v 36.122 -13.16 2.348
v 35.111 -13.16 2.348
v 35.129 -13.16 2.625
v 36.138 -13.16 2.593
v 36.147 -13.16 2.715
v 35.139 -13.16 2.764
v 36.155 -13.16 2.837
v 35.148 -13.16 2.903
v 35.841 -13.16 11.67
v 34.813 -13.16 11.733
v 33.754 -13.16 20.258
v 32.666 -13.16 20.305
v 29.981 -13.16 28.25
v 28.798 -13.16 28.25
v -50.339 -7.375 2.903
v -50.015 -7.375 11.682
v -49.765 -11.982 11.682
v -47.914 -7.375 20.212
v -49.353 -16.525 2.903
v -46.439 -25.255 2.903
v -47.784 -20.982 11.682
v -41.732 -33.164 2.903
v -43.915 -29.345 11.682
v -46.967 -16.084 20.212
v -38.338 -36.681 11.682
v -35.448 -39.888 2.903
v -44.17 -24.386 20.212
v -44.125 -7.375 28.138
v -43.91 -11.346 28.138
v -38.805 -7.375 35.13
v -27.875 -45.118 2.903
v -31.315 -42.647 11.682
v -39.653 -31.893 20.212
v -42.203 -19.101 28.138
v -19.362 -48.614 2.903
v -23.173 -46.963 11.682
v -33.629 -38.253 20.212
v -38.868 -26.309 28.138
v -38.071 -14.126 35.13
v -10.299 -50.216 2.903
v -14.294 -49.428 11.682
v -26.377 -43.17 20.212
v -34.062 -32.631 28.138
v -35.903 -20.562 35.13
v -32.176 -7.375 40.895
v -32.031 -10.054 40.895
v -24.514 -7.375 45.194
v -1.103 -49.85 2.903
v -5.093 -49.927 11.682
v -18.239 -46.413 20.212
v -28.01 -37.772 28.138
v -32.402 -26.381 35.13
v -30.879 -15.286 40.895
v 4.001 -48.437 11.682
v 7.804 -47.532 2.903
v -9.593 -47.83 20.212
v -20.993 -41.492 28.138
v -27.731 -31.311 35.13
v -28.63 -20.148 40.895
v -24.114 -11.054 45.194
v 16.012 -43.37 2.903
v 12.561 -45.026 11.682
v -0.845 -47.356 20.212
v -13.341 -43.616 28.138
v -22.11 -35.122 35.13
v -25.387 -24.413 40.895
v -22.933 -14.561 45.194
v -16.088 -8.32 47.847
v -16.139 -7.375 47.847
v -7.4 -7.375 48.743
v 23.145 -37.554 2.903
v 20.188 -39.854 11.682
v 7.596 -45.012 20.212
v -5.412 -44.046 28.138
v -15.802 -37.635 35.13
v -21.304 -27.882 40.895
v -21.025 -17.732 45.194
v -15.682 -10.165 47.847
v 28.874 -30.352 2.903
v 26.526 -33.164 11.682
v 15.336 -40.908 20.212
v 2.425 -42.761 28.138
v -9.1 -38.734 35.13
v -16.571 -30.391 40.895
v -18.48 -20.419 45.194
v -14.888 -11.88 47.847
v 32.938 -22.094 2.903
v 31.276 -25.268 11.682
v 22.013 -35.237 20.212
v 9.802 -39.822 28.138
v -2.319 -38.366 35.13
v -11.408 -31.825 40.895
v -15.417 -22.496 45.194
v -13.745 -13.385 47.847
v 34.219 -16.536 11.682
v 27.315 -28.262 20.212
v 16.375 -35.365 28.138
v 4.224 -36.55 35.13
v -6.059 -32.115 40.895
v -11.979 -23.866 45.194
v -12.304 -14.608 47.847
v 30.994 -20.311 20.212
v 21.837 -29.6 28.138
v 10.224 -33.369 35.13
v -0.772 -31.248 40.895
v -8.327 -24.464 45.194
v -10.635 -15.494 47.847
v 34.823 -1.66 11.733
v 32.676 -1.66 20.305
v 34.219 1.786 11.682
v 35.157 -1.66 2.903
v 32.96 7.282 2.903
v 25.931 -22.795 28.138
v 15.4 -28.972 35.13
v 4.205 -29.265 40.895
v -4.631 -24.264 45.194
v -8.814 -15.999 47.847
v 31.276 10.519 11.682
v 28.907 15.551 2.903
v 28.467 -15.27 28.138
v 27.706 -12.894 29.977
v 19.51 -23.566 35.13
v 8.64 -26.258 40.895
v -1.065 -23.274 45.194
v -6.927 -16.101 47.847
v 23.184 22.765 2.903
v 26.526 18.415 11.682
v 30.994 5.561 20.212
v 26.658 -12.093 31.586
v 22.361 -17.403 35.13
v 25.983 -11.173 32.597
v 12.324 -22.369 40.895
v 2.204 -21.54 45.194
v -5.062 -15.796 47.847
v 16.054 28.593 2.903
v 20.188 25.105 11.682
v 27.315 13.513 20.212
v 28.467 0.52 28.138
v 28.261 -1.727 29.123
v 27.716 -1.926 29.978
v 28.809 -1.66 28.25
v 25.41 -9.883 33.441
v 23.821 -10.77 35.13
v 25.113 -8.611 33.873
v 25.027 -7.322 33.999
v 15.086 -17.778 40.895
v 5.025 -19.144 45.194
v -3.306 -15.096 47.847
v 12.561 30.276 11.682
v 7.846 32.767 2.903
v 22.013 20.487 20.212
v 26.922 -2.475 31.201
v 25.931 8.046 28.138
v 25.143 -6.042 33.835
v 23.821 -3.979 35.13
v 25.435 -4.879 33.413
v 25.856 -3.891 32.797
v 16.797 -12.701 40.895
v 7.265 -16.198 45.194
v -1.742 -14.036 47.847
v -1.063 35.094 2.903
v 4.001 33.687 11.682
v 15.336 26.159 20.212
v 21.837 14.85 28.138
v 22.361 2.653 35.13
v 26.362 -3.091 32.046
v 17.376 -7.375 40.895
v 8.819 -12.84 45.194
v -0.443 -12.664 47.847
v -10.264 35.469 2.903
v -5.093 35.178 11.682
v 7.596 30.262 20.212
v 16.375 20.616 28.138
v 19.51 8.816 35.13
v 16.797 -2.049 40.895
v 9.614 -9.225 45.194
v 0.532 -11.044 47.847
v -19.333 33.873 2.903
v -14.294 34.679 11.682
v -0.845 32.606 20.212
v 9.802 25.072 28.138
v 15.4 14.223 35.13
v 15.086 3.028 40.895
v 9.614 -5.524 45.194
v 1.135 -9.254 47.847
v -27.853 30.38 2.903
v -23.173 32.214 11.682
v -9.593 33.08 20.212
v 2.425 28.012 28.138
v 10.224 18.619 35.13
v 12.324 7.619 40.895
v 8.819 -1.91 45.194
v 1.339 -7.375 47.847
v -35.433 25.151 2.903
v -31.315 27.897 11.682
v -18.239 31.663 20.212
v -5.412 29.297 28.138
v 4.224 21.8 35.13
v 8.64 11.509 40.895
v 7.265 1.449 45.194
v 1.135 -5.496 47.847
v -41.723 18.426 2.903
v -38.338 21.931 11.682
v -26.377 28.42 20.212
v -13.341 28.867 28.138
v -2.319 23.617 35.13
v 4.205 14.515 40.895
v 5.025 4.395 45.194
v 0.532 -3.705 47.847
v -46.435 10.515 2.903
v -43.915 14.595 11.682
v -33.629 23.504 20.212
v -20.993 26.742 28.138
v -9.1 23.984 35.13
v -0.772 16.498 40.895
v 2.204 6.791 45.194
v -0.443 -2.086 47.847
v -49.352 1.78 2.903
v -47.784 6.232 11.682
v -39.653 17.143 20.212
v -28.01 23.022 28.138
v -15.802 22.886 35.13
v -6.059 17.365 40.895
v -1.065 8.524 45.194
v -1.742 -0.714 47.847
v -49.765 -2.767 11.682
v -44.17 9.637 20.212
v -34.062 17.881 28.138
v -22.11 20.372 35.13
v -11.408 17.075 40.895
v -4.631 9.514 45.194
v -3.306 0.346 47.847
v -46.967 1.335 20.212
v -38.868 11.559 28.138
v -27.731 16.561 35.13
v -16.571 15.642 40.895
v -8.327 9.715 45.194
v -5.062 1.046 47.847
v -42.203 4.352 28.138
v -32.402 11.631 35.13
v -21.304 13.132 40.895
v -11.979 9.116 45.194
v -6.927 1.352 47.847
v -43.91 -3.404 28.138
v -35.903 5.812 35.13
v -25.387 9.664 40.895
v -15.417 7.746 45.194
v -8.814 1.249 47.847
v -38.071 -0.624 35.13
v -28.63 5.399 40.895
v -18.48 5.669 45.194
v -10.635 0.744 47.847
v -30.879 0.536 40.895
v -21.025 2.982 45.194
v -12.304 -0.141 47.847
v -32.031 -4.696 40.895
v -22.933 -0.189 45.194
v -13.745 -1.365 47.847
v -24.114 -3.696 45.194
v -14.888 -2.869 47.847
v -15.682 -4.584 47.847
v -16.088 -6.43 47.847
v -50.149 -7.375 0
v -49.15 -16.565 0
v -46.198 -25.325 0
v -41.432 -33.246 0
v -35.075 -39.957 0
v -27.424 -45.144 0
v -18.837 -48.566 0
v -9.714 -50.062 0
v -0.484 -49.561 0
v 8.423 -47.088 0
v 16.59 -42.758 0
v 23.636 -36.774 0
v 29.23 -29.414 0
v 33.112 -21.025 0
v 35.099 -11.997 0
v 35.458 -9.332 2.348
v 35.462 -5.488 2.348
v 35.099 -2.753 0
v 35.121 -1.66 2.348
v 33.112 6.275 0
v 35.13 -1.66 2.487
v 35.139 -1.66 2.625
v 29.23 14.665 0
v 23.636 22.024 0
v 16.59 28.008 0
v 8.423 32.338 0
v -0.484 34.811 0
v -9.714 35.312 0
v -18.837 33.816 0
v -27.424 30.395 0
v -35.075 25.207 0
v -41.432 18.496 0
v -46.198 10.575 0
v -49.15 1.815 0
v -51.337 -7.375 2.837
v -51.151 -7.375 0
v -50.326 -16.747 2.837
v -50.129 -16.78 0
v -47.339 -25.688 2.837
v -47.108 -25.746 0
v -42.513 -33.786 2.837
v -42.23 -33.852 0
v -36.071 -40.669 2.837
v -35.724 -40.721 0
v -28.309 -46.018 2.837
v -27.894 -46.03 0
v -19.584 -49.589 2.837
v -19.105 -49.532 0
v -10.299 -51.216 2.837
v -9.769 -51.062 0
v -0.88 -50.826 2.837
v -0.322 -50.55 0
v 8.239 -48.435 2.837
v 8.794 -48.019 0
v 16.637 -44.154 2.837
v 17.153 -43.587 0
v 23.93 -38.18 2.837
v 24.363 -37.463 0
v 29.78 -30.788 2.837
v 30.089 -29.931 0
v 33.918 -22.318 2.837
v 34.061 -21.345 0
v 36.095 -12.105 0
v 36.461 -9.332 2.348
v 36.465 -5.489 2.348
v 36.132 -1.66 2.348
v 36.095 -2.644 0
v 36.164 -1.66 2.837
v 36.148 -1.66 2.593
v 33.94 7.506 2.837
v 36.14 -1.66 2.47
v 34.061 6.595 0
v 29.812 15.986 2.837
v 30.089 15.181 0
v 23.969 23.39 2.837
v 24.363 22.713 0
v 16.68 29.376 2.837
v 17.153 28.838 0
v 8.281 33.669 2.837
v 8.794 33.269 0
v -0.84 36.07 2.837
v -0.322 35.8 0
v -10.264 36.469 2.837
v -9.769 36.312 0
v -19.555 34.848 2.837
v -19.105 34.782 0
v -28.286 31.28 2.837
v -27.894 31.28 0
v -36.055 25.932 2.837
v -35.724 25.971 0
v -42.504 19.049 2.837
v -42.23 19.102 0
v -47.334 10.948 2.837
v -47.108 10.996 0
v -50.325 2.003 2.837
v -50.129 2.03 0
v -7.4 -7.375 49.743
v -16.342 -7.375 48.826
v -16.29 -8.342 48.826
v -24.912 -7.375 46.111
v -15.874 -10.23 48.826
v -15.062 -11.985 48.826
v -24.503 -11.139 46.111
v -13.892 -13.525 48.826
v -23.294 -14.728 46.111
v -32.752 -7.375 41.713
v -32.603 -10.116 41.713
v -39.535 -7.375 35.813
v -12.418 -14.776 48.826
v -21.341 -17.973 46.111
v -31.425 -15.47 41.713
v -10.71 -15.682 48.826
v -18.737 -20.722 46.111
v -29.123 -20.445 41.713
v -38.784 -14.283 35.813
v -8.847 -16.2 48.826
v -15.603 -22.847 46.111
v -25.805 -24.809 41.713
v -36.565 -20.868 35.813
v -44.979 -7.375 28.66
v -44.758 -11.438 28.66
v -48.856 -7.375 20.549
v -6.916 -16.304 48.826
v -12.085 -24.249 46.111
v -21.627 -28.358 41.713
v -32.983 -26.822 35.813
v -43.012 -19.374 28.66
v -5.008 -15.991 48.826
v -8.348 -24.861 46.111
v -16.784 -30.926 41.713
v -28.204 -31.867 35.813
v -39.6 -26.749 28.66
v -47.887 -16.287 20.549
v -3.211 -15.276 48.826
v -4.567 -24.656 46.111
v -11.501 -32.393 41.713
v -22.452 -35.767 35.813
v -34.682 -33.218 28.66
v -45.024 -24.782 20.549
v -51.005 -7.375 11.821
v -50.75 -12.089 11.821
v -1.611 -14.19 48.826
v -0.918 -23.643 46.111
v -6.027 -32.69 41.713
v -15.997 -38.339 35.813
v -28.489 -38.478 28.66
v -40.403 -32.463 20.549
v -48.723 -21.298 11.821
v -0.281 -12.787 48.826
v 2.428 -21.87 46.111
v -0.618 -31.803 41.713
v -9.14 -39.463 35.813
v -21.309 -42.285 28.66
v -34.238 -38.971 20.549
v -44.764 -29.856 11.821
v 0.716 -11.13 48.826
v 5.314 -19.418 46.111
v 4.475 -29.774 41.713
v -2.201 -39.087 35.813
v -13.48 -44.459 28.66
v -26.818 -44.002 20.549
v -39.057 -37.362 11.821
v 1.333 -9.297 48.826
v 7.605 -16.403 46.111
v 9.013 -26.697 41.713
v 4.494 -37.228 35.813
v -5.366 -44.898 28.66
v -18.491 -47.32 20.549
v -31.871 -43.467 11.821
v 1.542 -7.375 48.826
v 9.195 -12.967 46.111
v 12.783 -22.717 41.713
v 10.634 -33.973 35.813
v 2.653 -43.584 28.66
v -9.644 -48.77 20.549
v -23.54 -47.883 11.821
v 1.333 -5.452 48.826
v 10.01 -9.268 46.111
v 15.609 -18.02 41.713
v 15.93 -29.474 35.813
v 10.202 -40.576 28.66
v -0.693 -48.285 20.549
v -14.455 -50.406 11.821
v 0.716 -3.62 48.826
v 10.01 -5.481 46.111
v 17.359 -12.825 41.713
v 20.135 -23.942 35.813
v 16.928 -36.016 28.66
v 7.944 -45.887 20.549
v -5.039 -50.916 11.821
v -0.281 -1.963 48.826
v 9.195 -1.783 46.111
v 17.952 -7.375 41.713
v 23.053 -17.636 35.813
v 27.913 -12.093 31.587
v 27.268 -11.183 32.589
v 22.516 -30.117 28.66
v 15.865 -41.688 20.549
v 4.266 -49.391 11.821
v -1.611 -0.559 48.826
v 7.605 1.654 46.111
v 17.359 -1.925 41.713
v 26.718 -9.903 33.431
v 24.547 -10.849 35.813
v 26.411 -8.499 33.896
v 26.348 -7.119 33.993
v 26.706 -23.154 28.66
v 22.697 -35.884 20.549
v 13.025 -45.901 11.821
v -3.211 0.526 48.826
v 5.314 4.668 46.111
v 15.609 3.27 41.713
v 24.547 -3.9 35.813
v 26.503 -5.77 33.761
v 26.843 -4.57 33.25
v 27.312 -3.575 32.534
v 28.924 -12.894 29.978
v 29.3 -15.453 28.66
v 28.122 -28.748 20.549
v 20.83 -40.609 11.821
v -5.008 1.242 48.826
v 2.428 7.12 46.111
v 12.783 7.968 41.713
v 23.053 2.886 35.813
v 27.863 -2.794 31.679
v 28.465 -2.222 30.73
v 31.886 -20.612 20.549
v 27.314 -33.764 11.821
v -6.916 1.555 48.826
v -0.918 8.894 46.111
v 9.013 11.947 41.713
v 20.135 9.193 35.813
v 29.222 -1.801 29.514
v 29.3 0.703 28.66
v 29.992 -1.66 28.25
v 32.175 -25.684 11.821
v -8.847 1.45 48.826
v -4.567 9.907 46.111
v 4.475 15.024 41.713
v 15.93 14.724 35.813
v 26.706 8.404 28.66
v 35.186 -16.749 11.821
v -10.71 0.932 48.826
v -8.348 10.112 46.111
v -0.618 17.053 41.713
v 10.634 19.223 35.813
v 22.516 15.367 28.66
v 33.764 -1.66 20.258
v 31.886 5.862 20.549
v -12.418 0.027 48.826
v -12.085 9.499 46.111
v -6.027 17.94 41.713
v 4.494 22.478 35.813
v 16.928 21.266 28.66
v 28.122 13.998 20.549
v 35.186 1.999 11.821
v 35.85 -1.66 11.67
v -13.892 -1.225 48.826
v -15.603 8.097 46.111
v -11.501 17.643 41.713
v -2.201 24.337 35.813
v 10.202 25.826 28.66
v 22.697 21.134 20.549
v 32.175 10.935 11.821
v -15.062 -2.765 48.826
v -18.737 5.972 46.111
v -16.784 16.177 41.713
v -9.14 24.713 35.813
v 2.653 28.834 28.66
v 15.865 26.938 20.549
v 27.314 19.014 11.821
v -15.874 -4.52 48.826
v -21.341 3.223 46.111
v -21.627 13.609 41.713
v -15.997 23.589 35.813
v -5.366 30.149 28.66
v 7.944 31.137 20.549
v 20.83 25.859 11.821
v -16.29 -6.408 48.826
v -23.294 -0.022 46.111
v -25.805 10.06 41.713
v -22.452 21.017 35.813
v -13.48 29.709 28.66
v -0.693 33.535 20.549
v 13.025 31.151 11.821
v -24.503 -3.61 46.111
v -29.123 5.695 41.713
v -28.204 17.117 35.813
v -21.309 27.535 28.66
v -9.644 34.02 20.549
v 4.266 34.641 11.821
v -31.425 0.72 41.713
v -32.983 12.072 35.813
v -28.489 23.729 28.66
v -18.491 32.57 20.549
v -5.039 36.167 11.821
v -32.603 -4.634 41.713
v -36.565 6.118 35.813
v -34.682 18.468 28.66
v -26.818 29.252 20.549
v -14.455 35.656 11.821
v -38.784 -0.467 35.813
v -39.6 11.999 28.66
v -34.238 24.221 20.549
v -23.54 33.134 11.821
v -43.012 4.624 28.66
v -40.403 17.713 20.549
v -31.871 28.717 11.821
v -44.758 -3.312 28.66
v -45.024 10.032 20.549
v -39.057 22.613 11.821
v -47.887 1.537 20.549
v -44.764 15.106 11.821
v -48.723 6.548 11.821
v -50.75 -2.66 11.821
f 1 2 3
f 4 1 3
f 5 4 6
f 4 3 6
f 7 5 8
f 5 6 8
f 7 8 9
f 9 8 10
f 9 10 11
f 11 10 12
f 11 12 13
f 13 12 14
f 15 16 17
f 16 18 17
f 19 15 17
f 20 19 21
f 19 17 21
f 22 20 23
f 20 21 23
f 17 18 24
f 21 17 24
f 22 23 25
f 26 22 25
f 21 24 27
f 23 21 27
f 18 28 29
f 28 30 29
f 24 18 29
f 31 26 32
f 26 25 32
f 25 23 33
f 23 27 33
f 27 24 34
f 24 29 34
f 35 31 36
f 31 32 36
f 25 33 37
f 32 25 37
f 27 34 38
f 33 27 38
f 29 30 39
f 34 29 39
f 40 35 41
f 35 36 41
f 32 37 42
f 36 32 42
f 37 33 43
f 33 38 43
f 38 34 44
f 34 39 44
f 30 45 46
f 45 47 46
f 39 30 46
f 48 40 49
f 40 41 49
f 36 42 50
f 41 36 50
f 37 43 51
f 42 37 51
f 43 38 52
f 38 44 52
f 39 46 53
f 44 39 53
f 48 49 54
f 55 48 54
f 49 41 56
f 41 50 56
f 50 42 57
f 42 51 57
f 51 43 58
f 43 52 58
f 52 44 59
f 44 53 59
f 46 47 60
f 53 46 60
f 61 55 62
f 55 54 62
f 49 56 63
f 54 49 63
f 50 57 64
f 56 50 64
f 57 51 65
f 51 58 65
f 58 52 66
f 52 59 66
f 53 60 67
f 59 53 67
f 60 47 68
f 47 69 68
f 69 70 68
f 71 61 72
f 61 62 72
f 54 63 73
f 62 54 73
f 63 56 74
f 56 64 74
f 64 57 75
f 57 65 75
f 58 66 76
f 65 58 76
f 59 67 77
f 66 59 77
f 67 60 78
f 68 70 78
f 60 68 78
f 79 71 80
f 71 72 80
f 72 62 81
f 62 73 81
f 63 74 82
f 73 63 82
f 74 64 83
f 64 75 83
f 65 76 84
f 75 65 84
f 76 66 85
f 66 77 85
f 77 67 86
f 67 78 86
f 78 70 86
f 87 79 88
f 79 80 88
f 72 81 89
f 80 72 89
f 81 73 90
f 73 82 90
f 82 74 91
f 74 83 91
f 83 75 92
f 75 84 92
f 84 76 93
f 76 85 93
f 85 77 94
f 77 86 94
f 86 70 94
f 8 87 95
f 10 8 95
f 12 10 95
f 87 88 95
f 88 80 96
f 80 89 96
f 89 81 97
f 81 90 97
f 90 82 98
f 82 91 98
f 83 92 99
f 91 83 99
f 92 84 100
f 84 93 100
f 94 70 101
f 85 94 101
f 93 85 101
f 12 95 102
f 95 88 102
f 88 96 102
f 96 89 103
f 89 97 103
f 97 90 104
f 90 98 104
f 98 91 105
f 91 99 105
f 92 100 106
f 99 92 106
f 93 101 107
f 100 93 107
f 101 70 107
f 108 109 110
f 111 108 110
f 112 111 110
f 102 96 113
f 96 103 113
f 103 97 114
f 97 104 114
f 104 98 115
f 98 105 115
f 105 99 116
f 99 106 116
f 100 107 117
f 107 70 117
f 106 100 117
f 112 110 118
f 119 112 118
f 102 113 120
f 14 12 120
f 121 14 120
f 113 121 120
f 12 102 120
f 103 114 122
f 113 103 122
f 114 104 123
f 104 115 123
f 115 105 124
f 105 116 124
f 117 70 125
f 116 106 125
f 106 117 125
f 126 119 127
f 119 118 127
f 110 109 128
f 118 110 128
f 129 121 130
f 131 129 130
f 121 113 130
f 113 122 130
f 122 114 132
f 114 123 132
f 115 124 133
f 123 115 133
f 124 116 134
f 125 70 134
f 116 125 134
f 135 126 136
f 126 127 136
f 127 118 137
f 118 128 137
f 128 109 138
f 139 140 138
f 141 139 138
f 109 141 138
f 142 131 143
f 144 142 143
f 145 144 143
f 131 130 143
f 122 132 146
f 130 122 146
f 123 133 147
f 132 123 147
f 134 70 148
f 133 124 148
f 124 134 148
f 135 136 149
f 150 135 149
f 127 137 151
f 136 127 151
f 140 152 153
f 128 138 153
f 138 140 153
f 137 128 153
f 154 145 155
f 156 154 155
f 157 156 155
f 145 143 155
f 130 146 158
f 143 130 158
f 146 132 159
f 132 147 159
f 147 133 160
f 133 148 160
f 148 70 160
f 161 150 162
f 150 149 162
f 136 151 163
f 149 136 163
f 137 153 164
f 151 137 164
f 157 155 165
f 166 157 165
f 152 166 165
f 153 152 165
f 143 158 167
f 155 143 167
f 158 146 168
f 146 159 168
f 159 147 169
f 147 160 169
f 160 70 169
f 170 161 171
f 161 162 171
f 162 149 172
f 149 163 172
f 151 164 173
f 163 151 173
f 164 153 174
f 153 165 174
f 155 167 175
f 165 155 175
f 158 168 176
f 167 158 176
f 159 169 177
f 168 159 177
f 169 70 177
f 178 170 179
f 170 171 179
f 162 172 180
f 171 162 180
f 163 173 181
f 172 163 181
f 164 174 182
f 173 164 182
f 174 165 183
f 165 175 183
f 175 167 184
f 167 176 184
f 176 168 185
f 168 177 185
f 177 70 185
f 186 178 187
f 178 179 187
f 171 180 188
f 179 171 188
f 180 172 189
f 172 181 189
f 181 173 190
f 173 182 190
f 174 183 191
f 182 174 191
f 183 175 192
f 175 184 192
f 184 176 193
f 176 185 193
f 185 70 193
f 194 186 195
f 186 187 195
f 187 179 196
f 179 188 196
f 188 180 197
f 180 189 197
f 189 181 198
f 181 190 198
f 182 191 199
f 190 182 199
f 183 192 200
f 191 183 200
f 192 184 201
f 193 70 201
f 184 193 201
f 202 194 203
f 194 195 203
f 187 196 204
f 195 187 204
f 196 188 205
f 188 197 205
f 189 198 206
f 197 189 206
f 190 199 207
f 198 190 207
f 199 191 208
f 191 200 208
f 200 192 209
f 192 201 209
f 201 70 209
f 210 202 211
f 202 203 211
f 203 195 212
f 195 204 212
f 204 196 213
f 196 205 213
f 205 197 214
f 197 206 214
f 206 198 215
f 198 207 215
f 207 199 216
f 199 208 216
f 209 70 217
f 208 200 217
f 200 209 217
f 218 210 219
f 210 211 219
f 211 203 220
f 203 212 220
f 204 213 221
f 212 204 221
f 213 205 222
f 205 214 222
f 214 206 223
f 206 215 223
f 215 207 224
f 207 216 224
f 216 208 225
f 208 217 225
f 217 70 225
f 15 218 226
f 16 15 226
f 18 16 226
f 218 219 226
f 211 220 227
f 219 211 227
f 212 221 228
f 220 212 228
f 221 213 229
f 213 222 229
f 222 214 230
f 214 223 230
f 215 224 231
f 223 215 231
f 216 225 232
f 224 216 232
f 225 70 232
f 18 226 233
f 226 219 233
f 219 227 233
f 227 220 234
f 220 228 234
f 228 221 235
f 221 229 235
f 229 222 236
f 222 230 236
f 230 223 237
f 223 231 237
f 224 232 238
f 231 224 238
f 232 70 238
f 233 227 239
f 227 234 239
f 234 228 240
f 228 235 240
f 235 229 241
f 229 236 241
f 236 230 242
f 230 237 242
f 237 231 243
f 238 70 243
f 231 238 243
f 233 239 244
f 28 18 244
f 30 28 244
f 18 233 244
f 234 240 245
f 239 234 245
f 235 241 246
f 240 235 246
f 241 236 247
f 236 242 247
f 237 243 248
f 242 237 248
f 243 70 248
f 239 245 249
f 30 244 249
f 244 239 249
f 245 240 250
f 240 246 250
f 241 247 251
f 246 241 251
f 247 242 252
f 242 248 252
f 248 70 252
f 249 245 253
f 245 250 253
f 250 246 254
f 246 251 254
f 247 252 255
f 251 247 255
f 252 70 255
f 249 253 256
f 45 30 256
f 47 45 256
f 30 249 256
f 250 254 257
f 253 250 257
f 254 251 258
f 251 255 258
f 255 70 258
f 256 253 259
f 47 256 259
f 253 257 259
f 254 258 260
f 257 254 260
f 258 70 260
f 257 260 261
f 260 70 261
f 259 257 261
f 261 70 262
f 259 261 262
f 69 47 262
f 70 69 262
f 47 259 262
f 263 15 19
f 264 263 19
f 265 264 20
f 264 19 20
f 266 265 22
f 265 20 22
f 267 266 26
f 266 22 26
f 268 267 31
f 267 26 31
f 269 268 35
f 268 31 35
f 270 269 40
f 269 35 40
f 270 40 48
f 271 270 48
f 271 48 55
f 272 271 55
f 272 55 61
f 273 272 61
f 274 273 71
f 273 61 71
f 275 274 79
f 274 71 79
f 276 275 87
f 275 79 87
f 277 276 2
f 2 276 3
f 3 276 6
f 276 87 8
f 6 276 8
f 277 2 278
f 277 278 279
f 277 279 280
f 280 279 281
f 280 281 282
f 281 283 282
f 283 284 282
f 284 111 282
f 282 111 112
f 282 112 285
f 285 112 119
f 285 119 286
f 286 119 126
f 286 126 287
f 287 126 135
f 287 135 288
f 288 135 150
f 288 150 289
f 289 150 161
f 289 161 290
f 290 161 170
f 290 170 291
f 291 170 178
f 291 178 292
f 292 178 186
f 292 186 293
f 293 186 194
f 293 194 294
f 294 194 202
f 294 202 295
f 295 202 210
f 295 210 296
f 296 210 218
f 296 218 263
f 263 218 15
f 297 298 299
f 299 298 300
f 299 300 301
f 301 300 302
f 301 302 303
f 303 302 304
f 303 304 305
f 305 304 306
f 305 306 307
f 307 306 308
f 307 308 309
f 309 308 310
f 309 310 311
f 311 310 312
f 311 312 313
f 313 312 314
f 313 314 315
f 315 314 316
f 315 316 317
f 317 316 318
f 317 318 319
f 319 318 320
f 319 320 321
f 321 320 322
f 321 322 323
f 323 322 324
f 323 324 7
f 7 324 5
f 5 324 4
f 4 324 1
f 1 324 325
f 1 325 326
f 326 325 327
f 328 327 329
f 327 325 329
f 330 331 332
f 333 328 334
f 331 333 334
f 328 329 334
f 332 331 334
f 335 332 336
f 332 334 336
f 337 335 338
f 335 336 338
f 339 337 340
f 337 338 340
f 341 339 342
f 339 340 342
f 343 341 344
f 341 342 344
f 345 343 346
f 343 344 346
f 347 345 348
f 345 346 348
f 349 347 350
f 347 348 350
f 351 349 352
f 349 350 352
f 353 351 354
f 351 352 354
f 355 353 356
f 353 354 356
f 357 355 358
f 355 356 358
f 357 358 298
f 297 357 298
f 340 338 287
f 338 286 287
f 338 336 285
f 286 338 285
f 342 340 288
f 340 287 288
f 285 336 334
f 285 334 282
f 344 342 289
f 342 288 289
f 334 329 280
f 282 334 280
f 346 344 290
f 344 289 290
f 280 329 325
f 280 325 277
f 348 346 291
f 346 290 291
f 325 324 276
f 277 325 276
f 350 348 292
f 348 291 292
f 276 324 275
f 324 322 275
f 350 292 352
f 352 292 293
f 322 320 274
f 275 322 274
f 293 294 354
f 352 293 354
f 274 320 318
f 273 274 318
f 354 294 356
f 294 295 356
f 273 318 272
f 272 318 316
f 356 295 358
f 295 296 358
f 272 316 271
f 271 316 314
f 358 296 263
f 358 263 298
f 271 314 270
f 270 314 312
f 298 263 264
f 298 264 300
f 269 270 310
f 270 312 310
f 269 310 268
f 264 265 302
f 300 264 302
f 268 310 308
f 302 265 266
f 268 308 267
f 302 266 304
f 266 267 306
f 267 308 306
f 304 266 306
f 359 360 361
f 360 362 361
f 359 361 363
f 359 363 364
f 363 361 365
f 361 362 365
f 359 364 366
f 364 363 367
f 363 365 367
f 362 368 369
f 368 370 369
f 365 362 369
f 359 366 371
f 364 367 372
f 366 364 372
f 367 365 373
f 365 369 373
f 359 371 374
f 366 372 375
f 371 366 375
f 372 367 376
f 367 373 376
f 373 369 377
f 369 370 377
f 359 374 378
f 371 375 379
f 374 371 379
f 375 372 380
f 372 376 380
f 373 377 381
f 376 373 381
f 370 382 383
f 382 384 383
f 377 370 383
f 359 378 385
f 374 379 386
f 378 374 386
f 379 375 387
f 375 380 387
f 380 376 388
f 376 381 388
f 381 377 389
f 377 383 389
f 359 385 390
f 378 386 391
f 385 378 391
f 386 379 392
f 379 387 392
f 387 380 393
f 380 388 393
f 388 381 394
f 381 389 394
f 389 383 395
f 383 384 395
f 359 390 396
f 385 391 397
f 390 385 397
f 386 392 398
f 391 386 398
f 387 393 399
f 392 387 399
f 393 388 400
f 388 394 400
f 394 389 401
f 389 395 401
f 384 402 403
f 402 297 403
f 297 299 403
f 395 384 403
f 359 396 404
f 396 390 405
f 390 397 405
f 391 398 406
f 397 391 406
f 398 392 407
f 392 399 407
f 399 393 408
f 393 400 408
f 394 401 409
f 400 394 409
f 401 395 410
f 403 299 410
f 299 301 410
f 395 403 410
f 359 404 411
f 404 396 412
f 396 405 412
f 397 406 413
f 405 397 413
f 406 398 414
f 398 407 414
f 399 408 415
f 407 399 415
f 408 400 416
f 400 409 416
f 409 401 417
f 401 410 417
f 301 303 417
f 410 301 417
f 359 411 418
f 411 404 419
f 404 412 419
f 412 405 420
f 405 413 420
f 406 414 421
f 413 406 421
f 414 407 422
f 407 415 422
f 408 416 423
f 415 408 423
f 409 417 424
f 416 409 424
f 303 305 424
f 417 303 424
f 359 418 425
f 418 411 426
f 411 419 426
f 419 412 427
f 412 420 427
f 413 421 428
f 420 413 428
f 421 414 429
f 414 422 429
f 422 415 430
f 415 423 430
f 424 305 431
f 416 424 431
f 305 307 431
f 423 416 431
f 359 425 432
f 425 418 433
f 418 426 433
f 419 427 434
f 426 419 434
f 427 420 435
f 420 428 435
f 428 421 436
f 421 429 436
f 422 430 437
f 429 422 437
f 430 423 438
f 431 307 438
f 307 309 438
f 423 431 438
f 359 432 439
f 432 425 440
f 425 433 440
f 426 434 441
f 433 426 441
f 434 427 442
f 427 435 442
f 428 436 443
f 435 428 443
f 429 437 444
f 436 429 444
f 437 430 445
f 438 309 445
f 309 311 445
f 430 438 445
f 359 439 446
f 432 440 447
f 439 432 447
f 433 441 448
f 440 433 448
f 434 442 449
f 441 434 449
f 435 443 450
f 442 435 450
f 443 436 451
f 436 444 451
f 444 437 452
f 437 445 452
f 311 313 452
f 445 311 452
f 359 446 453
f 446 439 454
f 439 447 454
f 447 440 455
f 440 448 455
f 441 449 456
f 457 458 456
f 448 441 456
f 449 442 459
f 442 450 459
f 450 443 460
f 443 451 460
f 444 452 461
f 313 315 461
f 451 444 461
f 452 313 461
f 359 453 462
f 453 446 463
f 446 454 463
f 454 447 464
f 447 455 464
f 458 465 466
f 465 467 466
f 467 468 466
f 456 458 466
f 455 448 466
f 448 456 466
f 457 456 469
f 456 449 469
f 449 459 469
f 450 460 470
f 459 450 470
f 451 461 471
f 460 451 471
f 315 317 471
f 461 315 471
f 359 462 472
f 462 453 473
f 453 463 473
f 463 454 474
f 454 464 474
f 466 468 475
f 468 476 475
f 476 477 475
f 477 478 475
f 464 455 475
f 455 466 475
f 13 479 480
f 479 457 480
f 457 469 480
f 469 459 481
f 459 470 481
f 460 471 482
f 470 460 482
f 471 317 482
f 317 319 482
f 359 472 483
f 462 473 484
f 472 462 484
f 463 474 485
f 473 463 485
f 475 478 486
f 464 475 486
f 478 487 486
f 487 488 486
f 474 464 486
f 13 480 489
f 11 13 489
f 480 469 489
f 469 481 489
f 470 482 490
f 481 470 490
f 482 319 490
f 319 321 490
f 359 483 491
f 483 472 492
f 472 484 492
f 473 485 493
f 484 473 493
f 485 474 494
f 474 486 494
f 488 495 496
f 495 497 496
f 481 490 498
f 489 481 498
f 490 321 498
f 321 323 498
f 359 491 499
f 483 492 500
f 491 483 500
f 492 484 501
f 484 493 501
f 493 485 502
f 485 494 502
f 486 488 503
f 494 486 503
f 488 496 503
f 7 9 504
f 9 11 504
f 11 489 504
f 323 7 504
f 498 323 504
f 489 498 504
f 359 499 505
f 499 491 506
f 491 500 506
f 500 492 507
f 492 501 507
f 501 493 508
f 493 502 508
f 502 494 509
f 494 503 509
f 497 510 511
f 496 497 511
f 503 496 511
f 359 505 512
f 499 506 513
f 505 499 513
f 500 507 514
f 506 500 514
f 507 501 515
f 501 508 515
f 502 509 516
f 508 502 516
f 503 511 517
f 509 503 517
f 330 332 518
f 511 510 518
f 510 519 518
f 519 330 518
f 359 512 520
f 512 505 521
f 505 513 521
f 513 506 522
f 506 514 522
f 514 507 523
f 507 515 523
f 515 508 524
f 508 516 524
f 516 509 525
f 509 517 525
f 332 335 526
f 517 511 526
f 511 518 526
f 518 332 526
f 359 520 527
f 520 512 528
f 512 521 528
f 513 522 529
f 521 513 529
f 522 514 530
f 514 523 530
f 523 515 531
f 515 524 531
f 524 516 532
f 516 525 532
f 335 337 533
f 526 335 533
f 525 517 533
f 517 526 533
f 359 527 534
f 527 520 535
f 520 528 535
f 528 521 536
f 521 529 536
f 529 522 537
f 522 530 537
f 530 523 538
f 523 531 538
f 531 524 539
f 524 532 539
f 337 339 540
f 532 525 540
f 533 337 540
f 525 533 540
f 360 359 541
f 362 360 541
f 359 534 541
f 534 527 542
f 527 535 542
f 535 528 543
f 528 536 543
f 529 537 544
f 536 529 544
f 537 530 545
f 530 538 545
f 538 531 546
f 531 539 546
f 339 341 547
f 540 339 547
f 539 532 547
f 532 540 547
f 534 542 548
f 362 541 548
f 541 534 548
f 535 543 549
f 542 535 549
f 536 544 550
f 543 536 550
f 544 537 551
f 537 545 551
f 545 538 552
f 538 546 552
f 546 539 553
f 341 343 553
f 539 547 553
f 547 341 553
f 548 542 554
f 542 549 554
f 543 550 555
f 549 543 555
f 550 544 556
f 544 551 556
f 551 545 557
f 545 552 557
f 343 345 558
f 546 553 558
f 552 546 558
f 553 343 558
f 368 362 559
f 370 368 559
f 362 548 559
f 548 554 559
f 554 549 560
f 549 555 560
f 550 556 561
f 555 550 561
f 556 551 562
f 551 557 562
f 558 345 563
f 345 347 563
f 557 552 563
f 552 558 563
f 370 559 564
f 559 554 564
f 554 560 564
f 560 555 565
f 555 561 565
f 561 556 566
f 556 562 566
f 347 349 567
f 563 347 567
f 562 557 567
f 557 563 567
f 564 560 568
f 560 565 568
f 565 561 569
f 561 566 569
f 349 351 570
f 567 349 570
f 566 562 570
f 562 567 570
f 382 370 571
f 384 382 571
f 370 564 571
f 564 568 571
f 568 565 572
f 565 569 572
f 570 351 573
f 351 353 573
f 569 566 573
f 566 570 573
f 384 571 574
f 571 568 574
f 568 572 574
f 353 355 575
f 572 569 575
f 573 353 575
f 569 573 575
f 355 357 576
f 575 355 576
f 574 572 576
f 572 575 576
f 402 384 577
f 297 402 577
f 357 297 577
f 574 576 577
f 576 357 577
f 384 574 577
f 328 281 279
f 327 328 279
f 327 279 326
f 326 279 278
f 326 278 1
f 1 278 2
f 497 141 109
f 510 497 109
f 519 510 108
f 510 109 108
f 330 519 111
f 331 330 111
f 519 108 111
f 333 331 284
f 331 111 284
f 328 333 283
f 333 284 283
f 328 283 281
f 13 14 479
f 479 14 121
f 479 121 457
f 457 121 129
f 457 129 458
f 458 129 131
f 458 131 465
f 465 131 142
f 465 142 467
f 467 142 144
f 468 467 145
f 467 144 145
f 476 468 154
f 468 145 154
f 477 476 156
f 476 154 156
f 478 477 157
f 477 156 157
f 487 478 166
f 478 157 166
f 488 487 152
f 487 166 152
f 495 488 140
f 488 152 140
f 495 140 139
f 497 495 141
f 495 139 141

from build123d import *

# Parameters (mm, degrees)
CUT_EXTRUDE1_DEPTH = 37.631109163


with BuildPart() as part:
    # Sketch2 → Revolve1 (revolve)
    with BuildSketch(Plane(origin=(0, -7.374853929, -7.41), x_dir=(-1, 0, 0), z_dir=(0, -1, 0))):
        with BuildLine():
            Line((50.149352541, -7.41), (50.339283308, -10.312639962))
            ThreePointArc((50.339283308, -10.312639962), (38.805254547, -42.539770141), (7.4, -56.153429675))
            Line((7.4, -56.153429675), (7.4, -57.153429675))
            ThreePointArc((7.4, -57.153429675), (39.535081297, -43.22340229), (51.337149367, -10.247345792))
            Line((51.337149367, -10.247345792), (51.151491045, -7.41))
            Line((51.151491045, -7.41), (50.149352541, -7.41))
        make_face()
    revolve(axis=Axis((-7.4, -7.374853929, -2), (0, 0, 1)))

    # Sketch3 → Cut-Extrude1 (cut, through all)
    with BuildSketch(Plane(origin=(0, 0, 0), x_dir=(0, 0, -1), z_dir=(1, 0, 0))):
        with BuildLine():
            Line((-2.348097087, -13.16), (-28.25, -13.16))
            ThreePointArc((-28.25, -13.16), (-34, -7.41), (-28.25, -1.66))
            Line((-28.25, -1.66), (-2.348097087, -1.66))
            Line((-2.348097087, -1.66), (-2.348097087, -13.16))
        make_face()
    extrude(amount=CUT_EXTRUDE1_DEPTH, mode=Mode.SUBTRACT)


solid = part.part
